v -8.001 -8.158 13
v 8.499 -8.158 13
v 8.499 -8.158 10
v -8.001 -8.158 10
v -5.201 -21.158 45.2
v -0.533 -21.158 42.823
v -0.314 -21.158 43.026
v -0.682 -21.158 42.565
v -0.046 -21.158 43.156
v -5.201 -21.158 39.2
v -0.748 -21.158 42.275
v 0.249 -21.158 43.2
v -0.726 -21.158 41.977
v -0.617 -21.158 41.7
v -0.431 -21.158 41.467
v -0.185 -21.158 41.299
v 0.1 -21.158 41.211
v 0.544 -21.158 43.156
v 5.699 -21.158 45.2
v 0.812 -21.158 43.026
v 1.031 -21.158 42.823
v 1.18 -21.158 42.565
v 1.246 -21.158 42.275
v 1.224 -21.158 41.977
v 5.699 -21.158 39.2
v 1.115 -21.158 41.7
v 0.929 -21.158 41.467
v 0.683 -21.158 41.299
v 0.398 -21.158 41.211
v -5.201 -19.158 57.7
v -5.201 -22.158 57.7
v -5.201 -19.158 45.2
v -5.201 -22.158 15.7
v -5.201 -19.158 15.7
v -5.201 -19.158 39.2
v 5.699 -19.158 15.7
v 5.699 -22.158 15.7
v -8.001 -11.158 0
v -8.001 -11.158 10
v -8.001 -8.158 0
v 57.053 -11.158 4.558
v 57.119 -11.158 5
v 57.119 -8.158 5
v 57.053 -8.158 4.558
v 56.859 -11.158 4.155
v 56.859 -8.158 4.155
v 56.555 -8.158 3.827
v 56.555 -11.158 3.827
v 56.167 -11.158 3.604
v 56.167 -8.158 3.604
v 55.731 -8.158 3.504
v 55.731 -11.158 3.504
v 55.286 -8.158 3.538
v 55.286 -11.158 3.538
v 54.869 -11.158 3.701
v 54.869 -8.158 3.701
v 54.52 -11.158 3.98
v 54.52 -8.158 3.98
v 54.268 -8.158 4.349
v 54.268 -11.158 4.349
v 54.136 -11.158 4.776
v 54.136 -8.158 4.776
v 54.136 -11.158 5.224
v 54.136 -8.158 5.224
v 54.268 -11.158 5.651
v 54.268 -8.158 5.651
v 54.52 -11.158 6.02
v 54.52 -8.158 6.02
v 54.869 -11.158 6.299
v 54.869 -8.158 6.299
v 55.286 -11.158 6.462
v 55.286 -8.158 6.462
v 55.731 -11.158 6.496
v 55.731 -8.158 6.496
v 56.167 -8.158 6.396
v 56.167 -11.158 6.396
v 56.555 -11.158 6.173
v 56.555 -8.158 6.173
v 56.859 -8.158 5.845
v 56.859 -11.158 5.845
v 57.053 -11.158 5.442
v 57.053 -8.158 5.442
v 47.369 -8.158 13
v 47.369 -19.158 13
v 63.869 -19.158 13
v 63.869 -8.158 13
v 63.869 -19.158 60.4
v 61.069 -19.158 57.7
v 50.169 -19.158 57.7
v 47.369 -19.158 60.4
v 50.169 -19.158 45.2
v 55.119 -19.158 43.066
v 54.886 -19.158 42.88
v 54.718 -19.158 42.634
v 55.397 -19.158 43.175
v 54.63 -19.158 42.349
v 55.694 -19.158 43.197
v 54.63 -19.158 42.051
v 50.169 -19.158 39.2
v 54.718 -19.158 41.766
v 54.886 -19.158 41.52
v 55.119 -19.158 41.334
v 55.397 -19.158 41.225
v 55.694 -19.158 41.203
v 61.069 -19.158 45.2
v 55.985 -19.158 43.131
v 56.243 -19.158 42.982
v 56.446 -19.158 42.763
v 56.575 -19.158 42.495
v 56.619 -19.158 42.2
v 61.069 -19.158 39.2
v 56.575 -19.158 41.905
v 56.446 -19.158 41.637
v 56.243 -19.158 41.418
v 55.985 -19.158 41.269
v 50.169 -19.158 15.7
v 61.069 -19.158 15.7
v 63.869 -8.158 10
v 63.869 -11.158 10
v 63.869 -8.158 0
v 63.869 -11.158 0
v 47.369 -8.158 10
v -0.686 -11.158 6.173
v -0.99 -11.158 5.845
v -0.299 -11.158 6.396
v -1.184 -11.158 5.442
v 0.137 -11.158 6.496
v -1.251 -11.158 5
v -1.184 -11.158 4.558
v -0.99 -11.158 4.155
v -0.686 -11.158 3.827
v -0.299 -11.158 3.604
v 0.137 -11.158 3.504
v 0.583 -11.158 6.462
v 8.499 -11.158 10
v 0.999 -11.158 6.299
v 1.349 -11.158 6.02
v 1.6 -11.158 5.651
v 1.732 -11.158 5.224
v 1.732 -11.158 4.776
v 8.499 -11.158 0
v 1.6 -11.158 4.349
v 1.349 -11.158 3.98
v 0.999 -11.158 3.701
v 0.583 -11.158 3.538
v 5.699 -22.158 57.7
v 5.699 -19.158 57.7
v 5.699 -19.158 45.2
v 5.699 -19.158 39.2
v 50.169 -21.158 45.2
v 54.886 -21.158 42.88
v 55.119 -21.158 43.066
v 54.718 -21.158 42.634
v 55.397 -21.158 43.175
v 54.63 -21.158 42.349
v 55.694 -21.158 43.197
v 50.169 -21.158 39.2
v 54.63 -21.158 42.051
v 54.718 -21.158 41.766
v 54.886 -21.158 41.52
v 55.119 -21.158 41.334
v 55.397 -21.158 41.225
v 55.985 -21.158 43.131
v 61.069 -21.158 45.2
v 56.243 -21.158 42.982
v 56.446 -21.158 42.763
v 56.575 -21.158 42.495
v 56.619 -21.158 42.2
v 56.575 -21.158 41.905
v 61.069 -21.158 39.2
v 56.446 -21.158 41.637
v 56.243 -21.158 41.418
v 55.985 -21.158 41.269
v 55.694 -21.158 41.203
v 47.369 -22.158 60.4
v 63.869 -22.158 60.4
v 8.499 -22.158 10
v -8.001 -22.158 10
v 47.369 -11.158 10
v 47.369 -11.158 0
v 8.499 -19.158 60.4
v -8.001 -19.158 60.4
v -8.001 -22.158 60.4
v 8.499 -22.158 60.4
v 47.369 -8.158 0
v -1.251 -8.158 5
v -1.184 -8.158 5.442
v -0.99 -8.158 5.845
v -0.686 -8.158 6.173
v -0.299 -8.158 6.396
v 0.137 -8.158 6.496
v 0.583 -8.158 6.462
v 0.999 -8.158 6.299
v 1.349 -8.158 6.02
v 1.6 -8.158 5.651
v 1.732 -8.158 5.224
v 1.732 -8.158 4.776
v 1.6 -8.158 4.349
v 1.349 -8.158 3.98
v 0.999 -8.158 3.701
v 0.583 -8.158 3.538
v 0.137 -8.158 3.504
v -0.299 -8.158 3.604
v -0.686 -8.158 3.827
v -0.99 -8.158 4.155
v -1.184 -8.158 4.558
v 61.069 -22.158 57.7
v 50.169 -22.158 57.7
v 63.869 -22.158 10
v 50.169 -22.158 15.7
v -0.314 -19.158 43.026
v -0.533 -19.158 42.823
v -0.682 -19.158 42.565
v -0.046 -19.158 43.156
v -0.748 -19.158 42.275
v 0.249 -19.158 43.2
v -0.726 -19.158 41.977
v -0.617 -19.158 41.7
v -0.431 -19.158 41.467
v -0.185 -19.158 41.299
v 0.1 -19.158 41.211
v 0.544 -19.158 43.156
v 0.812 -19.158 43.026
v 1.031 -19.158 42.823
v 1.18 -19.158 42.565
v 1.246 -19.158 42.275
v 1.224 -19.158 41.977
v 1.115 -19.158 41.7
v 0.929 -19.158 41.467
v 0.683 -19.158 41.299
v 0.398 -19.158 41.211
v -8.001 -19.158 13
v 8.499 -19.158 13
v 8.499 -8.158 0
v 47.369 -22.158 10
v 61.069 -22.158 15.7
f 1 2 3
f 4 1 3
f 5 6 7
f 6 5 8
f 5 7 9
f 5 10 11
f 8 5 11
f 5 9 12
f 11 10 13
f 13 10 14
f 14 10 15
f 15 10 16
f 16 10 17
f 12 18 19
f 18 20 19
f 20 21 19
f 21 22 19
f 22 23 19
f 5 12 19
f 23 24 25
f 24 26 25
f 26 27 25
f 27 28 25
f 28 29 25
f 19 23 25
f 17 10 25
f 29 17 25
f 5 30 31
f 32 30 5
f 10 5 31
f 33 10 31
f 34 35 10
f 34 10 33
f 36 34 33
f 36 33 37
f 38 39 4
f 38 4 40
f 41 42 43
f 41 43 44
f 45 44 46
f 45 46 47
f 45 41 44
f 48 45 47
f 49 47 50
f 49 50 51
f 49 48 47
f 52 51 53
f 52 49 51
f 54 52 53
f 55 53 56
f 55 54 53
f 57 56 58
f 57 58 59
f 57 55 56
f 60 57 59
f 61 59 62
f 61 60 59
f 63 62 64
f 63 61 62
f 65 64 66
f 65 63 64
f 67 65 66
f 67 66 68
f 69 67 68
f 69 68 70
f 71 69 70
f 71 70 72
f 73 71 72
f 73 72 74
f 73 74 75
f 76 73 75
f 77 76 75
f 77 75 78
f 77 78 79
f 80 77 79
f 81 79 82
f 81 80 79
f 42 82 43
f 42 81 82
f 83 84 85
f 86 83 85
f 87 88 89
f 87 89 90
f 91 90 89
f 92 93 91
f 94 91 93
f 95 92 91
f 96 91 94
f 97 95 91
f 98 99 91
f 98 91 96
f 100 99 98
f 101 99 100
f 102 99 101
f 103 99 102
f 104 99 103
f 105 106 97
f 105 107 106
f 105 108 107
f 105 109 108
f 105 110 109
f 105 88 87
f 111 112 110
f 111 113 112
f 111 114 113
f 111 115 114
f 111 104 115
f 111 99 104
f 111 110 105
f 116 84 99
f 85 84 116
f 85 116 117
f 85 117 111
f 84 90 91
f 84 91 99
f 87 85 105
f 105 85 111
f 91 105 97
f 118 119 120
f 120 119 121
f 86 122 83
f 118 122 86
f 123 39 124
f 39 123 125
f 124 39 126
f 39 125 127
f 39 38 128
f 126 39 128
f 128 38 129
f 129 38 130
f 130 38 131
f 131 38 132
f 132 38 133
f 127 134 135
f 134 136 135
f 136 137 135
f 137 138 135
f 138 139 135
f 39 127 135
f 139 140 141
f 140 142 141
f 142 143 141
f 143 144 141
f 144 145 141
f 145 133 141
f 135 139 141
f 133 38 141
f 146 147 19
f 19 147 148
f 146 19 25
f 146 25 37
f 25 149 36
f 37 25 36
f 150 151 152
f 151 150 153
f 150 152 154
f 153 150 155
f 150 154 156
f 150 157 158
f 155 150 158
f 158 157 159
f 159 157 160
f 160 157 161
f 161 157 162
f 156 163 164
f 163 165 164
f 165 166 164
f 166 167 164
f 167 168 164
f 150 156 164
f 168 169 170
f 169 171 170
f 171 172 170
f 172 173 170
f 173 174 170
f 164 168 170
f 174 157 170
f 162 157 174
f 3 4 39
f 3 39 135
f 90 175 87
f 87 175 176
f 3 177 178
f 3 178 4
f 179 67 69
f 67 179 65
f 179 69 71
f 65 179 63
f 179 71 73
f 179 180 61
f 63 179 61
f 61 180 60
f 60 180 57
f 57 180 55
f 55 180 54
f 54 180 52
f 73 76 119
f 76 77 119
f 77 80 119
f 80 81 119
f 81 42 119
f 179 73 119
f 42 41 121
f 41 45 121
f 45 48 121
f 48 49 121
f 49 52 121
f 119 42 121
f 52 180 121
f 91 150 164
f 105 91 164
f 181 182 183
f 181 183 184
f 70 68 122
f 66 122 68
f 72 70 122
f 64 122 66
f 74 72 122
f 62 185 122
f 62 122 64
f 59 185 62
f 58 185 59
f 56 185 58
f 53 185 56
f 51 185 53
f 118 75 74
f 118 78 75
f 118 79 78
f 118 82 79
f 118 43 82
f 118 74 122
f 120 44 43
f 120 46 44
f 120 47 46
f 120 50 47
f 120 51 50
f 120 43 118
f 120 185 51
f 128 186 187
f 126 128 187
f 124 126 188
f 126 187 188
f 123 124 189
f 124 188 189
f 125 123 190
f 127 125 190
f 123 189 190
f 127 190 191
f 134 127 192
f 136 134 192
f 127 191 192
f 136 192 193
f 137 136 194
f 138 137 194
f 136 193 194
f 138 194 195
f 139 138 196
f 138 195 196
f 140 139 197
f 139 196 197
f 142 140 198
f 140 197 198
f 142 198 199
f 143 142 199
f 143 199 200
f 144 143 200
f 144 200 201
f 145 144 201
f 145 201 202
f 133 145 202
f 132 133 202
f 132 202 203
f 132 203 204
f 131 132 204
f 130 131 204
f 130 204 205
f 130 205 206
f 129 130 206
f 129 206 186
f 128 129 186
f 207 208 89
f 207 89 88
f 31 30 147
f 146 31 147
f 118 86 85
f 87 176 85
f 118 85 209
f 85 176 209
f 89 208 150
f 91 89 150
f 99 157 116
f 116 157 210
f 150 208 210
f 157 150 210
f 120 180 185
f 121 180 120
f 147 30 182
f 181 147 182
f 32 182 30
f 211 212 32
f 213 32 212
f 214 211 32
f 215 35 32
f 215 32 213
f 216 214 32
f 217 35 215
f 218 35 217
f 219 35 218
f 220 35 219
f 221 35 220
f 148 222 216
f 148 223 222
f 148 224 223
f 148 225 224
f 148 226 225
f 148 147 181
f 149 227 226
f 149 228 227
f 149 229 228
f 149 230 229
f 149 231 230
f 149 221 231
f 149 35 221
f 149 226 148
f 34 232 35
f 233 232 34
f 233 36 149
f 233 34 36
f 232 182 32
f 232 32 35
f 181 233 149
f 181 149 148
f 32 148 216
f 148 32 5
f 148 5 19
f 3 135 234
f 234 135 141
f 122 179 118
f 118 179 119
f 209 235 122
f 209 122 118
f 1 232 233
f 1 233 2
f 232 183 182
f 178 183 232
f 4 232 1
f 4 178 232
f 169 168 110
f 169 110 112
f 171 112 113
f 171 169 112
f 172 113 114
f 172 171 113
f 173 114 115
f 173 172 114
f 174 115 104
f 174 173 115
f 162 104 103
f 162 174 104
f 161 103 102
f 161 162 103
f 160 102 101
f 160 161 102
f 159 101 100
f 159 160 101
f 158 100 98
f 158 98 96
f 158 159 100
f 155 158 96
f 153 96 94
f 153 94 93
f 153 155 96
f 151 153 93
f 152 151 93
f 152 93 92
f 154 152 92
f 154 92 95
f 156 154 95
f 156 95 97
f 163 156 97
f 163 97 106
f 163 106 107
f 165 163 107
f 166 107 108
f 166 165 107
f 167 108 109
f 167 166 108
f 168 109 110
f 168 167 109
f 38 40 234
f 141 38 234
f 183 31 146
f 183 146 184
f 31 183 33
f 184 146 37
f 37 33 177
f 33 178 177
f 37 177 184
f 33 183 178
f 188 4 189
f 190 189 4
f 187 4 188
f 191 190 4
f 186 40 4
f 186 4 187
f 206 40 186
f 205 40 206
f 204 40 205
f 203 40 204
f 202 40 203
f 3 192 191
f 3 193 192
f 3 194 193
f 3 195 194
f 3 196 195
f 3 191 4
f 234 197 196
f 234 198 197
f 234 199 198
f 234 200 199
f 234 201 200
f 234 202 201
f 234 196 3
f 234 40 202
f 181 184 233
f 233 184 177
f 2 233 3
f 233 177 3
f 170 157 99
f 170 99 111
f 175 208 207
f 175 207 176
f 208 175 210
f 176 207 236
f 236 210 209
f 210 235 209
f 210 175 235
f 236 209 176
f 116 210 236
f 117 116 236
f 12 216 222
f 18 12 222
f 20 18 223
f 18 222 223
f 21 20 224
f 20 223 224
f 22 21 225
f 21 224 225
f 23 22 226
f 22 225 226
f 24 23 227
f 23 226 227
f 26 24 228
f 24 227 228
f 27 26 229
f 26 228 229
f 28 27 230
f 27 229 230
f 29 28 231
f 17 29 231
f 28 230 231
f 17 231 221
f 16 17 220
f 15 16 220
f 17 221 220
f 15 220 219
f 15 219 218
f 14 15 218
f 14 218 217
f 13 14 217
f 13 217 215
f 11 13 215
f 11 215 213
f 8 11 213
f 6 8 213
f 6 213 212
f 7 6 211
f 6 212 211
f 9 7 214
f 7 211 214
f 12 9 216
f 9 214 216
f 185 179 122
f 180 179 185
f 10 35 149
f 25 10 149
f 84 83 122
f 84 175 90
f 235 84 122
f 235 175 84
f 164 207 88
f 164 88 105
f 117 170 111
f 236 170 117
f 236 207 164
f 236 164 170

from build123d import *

# Parameters (mm, degrees)
SKETCH1_W                   = 170
SKETCH1_H                   = 3
BOSS_EXTRUDE1_DEPTH         = 10
SKETCH4_R                   = 1.2
CUT_EXTRUDE1_DEPTH          = 21
SKETCH2_W                   = 45.3
SKETCH2_H                   = 3
BOSS_EXTRUDE6_DEPTH         = 20.3
SKETCH5_R                   = 8.5
CUT_EXTRUDE2_DEPTH          = 20.3
SKETCH6_W                   = 45.3
SKETCH6_H                   = 3
BOSS_EXTRUDE7_DEPTH         = 20.3
SKETCH7_R                   = 8.5
CUT_EXTRUDE3_DEPTH          = 100.885733504
SKETCH11_W                  = 3
SKETCH11_H                  = 14
BOSS_EXTRUDE10_DEPTH        = 16.5
SKETCH12_W                  = 16.5
SKETCH12_H                  = 3
BOSS_EXTRUDE11_DEPTH        = 47.4
SKETCH13_W                  = 10.9
SKETCH13_H                  = 42
CUT_EXTRUDE5_DEPTH          = 120.823102106
SKETCH14_W                  = 23
SKETCH14_H                  = 3
BOSS_EXTRUDE12_DEPTH        = 9.5
SKETCH15_W                  = 17
SKETCH15_H                  = 3.5
CUT_EXTRUDE6_DEPTH          = 9.5
CUT_EXTRUDE7_DEPTH          = 124.643656623
CUT_EXTRUDE7_DEPTH_BACK     = 124.643656623
SKETCH16_W                  = 63.359581381
SKETCH16_H                  = 20.22579087
SKETCH16_W_2                = 63.3
SKETCH16_H_2                = 23.873064633
CUT_EXTRUDE9_DEPTH          = 85.468149706
CUT_EXTRUDE9_DEPTH_BACK     = 85.468149706
SKETCH17_W                  = 10.34603958
SKETCH17_H                  = 19.965926612
SKETCH18_R                  = 1.5
CUT_EXTRUDE10_DEPTH         = 10
SKETCH22_W                  = 30.660472615
SKETCH22_H                  = 85.471317495
CUT_EXTRUDE14_DEPTH         = 85.468149706
SKETCH23_W                  = 30.27196453
SKETCH23_H                  = 7.283480188
CUT_EXTRUDE15_DEPTH         = 74.568083116
SKETCH24_W                  = 10.9
SKETCH24_H                  = 6
SKETCH24_R                  = 1
BOSS_EXTRUDE13_DEPTH        = 2
BODY_MOVE_COPY5_START       = -22.157761352
BODY_MOVE_COPY5_OUTLINE_W   = 16.5
BODY_MOVE_COPY5_OUTLINE_H   = 50.4
BODY_MOVE_COPY5_OUTLINE_W_2 = 10.9
BODY_MOVE_COPY5_OUTLINE_H_2 = 42
BODY_MOVE_COPY5_DEPTH       = 3
BODY_MOVE_COPY5_START_2     = -19.157761352
BODY_MOVE_COPY5_2_OUTLINE_W = 16.5
BODY_MOVE_COPY5_2_OUTLINE_H = 3
BODY_MOVE_COPY5_2_DEPTH     = 11
BODY_MOVE_COPY5_START_3     = -21.157761352
BODY_MOVE_COPY5_3_OUTLINE_W = 10.9
BODY_MOVE_COPY5_3_OUTLINE_H = 6
BODY_MOVE_COPY5_3_OUTLINE_R = 1
BODY_MOVE_COPY5_3_DEPTH     = 2
BODY_MOVE_COPY5_START_4     = -11.157761352
BODY_MOVE_COPY5_4_OUTLINE_W = 16.5
BODY_MOVE_COPY5_4_OUTLINE_H = 10
BODY_MOVE_COPY5_4_OUTLINE_R = 1.5
BODY_MOVE_COPY5_4_DEPTH     = 3


# Read off the part's stored shape, not the designer's step: Body-Move/Copy5
with BuildPart() as part:
    # Sketch1 → Boss-Extrude1 (new body)
    with BuildSketch(Plane.XY):
        with Locations((13.639372454, -9.657761352)):
            Rectangle(SKETCH1_W, SKETCH1_H)
    extrude(amount=BOSS_EXTRUDE1_DEPTH)

    # Sketch4 → Cut-Extrude1 (cut)
    with BuildSketch(Plane(origin=(0, -8.157761352, 0), x_dir=(1, 0, 0), z_dir=(0, 1, 0))):
        with Locations(Location((-63.360627546, -4.938536908, 0), (0, 0, 180))):
            Circle(SKETCH4_R)
        with Locations(Location((90.639372454, -5.283238547, 0), (0, 0, 180))):
            Circle(SKETCH4_R)
    extrude(amount=-CUT_EXTRUDE1_DEPTH, mode=Mode.SUBTRACT)

    # Sketch2 → Boss-Extrude6 (add)
    with BuildSketch(Plane(origin=(0, -8.157761352, 0), x_dir=(1, 0, 0), z_dir=(0, 1, 0))):
        with Locations((-30.710627546, -8.5)):
            Rectangle(SKETCH2_W, SKETCH2_H)
    extrude(amount=BOSS_EXTRUDE6_DEPTH)

    # Sketch5 → Cut-Extrude2 (cut)
    with BuildSketch(Plane(origin=(0, 0, 7), x_dir=(-1, 0, 0), z_dir=(0, 0, -1))):
        with Locations((17.460627546, 1.942238648)):
            Circle(SKETCH5_R)
        with Locations((43.960627546, 1.942238648)):
            Circle(SKETCH5_R)
        with BuildLine():
            Line((27.510627546, -3.557761352), (33.910627546, -3.557761352))
            ThreePointArc((33.910627546, -3.557761352), (35.810627546, -5.457761352), (33.910627546, -7.357761352))
            Line((33.910627546, -7.357761352), (27.510627546, -7.357761352))
            ThreePointArc((27.510627546, -7.357761352), (25.610627546, -5.457761352), (27.510627546, -3.557761352))
        make_face()
    extrude(amount=-CUT_EXTRUDE2_DEPTH, mode=Mode.SUBTRACT)

    # Sketch6 → Boss-Extrude7 (add)
    with BuildSketch(Plane(origin=(0, -8.157761352, 0), x_dir=(1, 0, 0), z_dir=(0, 1, 0))):
        with Locations((57.989372454, -8.5)):
            Rectangle(SKETCH6_W, SKETCH6_H)
    extrude(amount=BOSS_EXTRUDE7_DEPTH)

    # Sketch7 → Cut-Extrude3 (cut, through all)
    with BuildSketch(Plane.XY.offset(10)):
        with Locations((44.739372454, 1.942238648)):
            Circle(SKETCH7_R)
        with Locations((71.239372454, 1.942238648)):
            Circle(SKETCH7_R)
        with BuildLine():
            Line((54.839372454, -3.557761352), (61.239372454, -3.557761352))
            ThreePointArc((61.239372454, -3.557761352), (63.139372454, -5.457761352), (61.239372454, -7.357761352))
            Line((61.239372454, -7.357761352), (54.839372454, -7.357761352))
            ThreePointArc((54.839372454, -7.357761352), (52.939372454, -5.457761352), (54.839372454, -3.557761352))
        make_face()
    extrude(amount=-CUT_EXTRUDE3_DEPTH, mode=Mode.SUBTRACT)


with BuildPart() as body_2:
    # Sketch11 → Boss-Extrude10 (new body)
    with BuildSketch(Plane(origin=(98.639372454, 0, 0), x_dir=(0, 0, -1), z_dir=(1, 0, 0))):
        with Locations((-11.5, -15.157761352)):
            Rectangle(SKETCH11_W, SKETCH11_H)
    extrude(amount=BOSS_EXTRUDE10_DEPTH)


with BuildPart() as body_2_1:
    # Body-Move/Copy1: moved
    add(body_2.part.moved(Location((-106.640418619, 0, 0))))

    # Sketch12 → Boss-Extrude11 (add)
    with BuildSketch(Plane.XY.offset(13)):
        with Locations((0.248953835, -20.657761352)):
            Rectangle(SKETCH12_W, SKETCH12_H)
    extrude(amount=BOSS_EXTRUDE11_DEPTH)

    # Sketch13 → Cut-Extrude5 (cut, through all)
    with BuildSketch(Plane(origin=(0, -19.157761352, 0), x_dir=(1, 0, 0), z_dir=(0, 1, 0))):
        with Locations((0.248953835, -36.7)):
            Rectangle(SKETCH13_W, SKETCH13_H)
    extrude(amount=-CUT_EXTRUDE5_DEPTH, mode=Mode.SUBTRACT)


with BuildPart() as body_3:
    # Body-Move/Copy3: copy of body 2
    add(body_2_1.part.moved(Location((26.84603958, 0, 0))))


with BuildPart() as body_4:
    # Sketch14 → Boss-Extrude12 (new body)
    with BuildSketch(Plane(origin=(0, -19.157761352, 0), x_dir=(1, 0, 0), z_dir=(0, 1, 0))):
        with Locations((-0.888899403, -70.178295355)):
            Rectangle(SKETCH14_W, SKETCH14_H)
    extrude(amount=-BOSS_EXTRUDE12_DEPTH)

    # Sketch15 → Cut-Extrude6 (cut)
    with BuildSketch(Plane.XY.offset(71.678295355)):
        with Locations((-0.888899403, -23.907761352)):
            Rectangle(SKETCH15_W, SKETCH15_H)
    extrude(amount=-CUT_EXTRUDE6_DEPTH, mode=Mode.SUBTRACT)


with BuildPart() as body_5:
    # Body-Move/Copy4: copy of body 4
    add(body_4.part.moved(Location((29.098347772, 0, 0))))


with BuildPart() as cut_extrude7_tool:
    # Sketch16 → Cut-Extrude7 (new, two sides: drawn at the far end of the back side and taken through both)
    with BuildSketch(Plane(origin=(0, -8.157761352, 0), x_dir=(1, 0, 0), z_dir=(0, 1, 0)).offset(-CUT_EXTRUDE7_DEPTH_BACK)):
        with Locations((-39.680836856, -5.049901743)):
            Rectangle(SKETCH16_W, SKETCH16_H)
        with Locations((66.989372454, -3.392050033)):
            Rectangle(SKETCH16_W_2, SKETCH16_H_2)
    extrude(amount=CUT_EXTRUDE7_DEPTH + CUT_EXTRUDE7_DEPTH_BACK)


with BuildPart() as part_1:
    add(part.part)

    # Cut-Extrude7: cut by cut_extrude7_tool
    add(cut_extrude7_tool.part, mode=Mode.SUBTRACT)

    # Sketch17 → Cut-Extrude9 (cut, two sides: drawn at the far end of the back side and taken through both)
    with BuildSketch(Plane(origin=(0, -8.157761352, 0), x_dir=(1, 0, 0), z_dir=(0, 1, 0)).offset(-CUT_EXTRUDE9_DEPTH_BACK)):
        with Locations((13.671973625, -0.017036694)):
            Rectangle(SKETCH17_W, SKETCH17_H)
    extrude(amount=CUT_EXTRUDE9_DEPTH + CUT_EXTRUDE9_DEPTH_BACK, mode=Mode.SUBTRACT)


with BuildPart() as body_3_1:
    add(body_3.part)

    # Cut-Extrude7: cut by cut_extrude7_tool
    add(cut_extrude7_tool.part, mode=Mode.SUBTRACT)


with BuildPart() as cut_extrude9_piece_1:
    # of the separate pieces the step leaves, piece 1, a body of its own (cut_extrude9_pieces)
    add(part_1.part.solids().sort_by_distance((8.498953835, -11.157761352, 0))[0])


with BuildPart() as cut_extrude9_piece_2:
    # of the separate pieces the step leaves, piece 2, a body of its own (cut_extrude9_pieces)
    add(part_1.part.solids().sort_by_distance((35.339372454, -11.157761352, 0))[0])


with BuildPart() as cut_extrude10_tool:
    # Sketch18 → Cut-Extrude10 (new body)
    with BuildSketch(Plane(origin=(0, -8.157761352, 0), x_dir=(1, 0, 0), z_dir=(0, 1, 0))):
        with Locations(Location((0.248953835, -5, 0), (0, 0, 180))):
            Circle(SKETCH18_R)
        with Locations(Location((27.094993415, -5, 0), (0, 0, 180))):
            Circle(SKETCH18_R)
    extrude(amount=-CUT_EXTRUDE10_DEPTH)


with BuildPart() as cut_extrude9_piece_1_1:
    add(cut_extrude9_piece_1.part)

    # Cut-Extrude10: cut by cut_extrude10_tool
    add(cut_extrude10_tool.part, mode=Mode.SUBTRACT)


with BuildPart() as cut_extrude9_piece_2_1:
    add(cut_extrude9_piece_2.part)

    # Cut-Extrude10: cut by cut_extrude10_tool
    add(cut_extrude10_tool.part, mode=Mode.SUBTRACT)


with BuildPart() as cut_extrude14_tool:
    # Sketch22 → Cut-Extrude14 (new, through all)
    with BuildSketch(Plane(origin=(0, -8.157761352, 0), x_dir=(1, 0, 0), z_dir=(0, 1, 0))):
        with Locations((30.670536688, -31.705614743)):
            Rectangle(SKETCH22_W, SKETCH22_H)
    extrude(amount=-CUT_EXTRUDE14_DEPTH)


with BuildPart() as body_3_2:
    add(body_3_1.part)

    # Cut-Extrude14: cut by cut_extrude14_tool
    add(cut_extrude14_tool.part, mode=Mode.SUBTRACT)


with BuildPart() as body_5_1:
    add(body_5.part)

    # Cut-Extrude14: cut by cut_extrude14_tool
    add(cut_extrude14_tool.part, mode=Mode.SUBTRACT)


with BuildPart() as cut_extrude9_piece_2_2:
    add(cut_extrude9_piece_2_1.part)

    # Cut-Extrude14: cut by cut_extrude14_tool
    add(cut_extrude14_tool.part, mode=Mode.SUBTRACT)


with BuildPart() as body_4_1:
    add(body_4.part)

    # Sketch23 → Cut-Extrude15 (cut, through all)
    with BuildSketch(Plane(origin=(0, -19.157761352, 0), x_dir=(1, 0, 0), z_dir=(0, 1, 0))):
        with Locations((-0.513403302, -70.531997743)):
            Rectangle(SKETCH23_W, SKETCH23_H)
    extrude(amount=-CUT_EXTRUDE15_DEPTH, mode=Mode.SUBTRACT)


with BuildPart() as body_2_2:
    add(body_2_1.part)

    # Sketch24 → Boss-Extrude13 (add)
    with BuildSketch(Plane(origin=(0, -19.157761352, 0), x_dir=(1, 0, 0), z_dir=(0, 1, 0))):
        with Locations((0.248953835, -42.2)):
            Rectangle(SKETCH24_W, SKETCH24_H)
        with Locations(Location((0.248953835, -42.2, 0), (0, 0, 270))):
            Circle(SKETCH24_R, mode=Mode.SUBTRACT)
    extrude(amount=-BOSS_EXTRUDE13_DEPTH)


with BuildPart() as body_3_2_1:
    # Body-Move/Copy5 outline → Body-Move/Copy5 (new body)
    with BuildSketch(Plane(origin=(0, 0, 0), x_dir=(1, 0, 0), z_dir=(0, 1, 0)).offset(BODY_MOVE_COPY5_START)):
        with Locations((55.61929397, -35.2)):
            Rectangle(BODY_MOVE_COPY5_OUTLINE_W, BODY_MOVE_COPY5_OUTLINE_H)
        with Locations((55.61929397, -36.7)):
            Rectangle(BODY_MOVE_COPY5_OUTLINE_W_2, BODY_MOVE_COPY5_OUTLINE_H_2, mode=Mode.SUBTRACT)
    extrude(amount=BODY_MOVE_COPY5_DEPTH)

    # Body-Move_Copy5 2 outline → Body-Move_Copy5 2 (add)
    with BuildSketch(Plane(origin=(0, 0, 0), x_dir=(1, 0, 0), z_dir=(0, 1, 0)).offset(BODY_MOVE_COPY5_START_2)):
        with Locations((55.61929397, -11.5)):
            Rectangle(BODY_MOVE_COPY5_2_OUTLINE_W, BODY_MOVE_COPY5_2_OUTLINE_H)
    extrude(amount=BODY_MOVE_COPY5_2_DEPTH)

    # Body-Move_Copy5 3 outline → Body-Move_Copy5 3 (add)
    with BuildSketch(Plane(origin=(0, 0, 0), x_dir=(1, 0, 0), z_dir=(0, 1, 0)).offset(BODY_MOVE_COPY5_START_3)):
        with Locations((55.61929397, -42.2)):
            Rectangle(BODY_MOVE_COPY5_3_OUTLINE_W, BODY_MOVE_COPY5_3_OUTLINE_H)
        with Locations((55.61929397, -42.2)):
            Circle(BODY_MOVE_COPY5_3_OUTLINE_R, mode=Mode.SUBTRACT)
    extrude(amount=BODY_MOVE_COPY5_3_DEPTH)


with BuildPart() as body_4_2:
    # Body-Move_Copy5 4 outline → Body-Move_Copy5 4 (new body)
    with BuildSketch(Plane(origin=(0, 0, 0), x_dir=(1, 0, 0), z_dir=(0, 1, 0)).offset(BODY_MOVE_COPY5_START_4)):
        with Locations((55.61929397, -5)):
            Rectangle(BODY_MOVE_COPY5_4_OUTLINE_W, BODY_MOVE_COPY5_4_OUTLINE_H)
        with Locations((55.61929397, -5)):
            Circle(BODY_MOVE_COPY5_4_OUTLINE_R, mode=Mode.SUBTRACT)
    extrude(amount=BODY_MOVE_COPY5_4_DEPTH)


solid = Compound([cut_extrude9_piece_1_1.part, body_2_2.part, body_3_2_1.part, body_4_2.part])
